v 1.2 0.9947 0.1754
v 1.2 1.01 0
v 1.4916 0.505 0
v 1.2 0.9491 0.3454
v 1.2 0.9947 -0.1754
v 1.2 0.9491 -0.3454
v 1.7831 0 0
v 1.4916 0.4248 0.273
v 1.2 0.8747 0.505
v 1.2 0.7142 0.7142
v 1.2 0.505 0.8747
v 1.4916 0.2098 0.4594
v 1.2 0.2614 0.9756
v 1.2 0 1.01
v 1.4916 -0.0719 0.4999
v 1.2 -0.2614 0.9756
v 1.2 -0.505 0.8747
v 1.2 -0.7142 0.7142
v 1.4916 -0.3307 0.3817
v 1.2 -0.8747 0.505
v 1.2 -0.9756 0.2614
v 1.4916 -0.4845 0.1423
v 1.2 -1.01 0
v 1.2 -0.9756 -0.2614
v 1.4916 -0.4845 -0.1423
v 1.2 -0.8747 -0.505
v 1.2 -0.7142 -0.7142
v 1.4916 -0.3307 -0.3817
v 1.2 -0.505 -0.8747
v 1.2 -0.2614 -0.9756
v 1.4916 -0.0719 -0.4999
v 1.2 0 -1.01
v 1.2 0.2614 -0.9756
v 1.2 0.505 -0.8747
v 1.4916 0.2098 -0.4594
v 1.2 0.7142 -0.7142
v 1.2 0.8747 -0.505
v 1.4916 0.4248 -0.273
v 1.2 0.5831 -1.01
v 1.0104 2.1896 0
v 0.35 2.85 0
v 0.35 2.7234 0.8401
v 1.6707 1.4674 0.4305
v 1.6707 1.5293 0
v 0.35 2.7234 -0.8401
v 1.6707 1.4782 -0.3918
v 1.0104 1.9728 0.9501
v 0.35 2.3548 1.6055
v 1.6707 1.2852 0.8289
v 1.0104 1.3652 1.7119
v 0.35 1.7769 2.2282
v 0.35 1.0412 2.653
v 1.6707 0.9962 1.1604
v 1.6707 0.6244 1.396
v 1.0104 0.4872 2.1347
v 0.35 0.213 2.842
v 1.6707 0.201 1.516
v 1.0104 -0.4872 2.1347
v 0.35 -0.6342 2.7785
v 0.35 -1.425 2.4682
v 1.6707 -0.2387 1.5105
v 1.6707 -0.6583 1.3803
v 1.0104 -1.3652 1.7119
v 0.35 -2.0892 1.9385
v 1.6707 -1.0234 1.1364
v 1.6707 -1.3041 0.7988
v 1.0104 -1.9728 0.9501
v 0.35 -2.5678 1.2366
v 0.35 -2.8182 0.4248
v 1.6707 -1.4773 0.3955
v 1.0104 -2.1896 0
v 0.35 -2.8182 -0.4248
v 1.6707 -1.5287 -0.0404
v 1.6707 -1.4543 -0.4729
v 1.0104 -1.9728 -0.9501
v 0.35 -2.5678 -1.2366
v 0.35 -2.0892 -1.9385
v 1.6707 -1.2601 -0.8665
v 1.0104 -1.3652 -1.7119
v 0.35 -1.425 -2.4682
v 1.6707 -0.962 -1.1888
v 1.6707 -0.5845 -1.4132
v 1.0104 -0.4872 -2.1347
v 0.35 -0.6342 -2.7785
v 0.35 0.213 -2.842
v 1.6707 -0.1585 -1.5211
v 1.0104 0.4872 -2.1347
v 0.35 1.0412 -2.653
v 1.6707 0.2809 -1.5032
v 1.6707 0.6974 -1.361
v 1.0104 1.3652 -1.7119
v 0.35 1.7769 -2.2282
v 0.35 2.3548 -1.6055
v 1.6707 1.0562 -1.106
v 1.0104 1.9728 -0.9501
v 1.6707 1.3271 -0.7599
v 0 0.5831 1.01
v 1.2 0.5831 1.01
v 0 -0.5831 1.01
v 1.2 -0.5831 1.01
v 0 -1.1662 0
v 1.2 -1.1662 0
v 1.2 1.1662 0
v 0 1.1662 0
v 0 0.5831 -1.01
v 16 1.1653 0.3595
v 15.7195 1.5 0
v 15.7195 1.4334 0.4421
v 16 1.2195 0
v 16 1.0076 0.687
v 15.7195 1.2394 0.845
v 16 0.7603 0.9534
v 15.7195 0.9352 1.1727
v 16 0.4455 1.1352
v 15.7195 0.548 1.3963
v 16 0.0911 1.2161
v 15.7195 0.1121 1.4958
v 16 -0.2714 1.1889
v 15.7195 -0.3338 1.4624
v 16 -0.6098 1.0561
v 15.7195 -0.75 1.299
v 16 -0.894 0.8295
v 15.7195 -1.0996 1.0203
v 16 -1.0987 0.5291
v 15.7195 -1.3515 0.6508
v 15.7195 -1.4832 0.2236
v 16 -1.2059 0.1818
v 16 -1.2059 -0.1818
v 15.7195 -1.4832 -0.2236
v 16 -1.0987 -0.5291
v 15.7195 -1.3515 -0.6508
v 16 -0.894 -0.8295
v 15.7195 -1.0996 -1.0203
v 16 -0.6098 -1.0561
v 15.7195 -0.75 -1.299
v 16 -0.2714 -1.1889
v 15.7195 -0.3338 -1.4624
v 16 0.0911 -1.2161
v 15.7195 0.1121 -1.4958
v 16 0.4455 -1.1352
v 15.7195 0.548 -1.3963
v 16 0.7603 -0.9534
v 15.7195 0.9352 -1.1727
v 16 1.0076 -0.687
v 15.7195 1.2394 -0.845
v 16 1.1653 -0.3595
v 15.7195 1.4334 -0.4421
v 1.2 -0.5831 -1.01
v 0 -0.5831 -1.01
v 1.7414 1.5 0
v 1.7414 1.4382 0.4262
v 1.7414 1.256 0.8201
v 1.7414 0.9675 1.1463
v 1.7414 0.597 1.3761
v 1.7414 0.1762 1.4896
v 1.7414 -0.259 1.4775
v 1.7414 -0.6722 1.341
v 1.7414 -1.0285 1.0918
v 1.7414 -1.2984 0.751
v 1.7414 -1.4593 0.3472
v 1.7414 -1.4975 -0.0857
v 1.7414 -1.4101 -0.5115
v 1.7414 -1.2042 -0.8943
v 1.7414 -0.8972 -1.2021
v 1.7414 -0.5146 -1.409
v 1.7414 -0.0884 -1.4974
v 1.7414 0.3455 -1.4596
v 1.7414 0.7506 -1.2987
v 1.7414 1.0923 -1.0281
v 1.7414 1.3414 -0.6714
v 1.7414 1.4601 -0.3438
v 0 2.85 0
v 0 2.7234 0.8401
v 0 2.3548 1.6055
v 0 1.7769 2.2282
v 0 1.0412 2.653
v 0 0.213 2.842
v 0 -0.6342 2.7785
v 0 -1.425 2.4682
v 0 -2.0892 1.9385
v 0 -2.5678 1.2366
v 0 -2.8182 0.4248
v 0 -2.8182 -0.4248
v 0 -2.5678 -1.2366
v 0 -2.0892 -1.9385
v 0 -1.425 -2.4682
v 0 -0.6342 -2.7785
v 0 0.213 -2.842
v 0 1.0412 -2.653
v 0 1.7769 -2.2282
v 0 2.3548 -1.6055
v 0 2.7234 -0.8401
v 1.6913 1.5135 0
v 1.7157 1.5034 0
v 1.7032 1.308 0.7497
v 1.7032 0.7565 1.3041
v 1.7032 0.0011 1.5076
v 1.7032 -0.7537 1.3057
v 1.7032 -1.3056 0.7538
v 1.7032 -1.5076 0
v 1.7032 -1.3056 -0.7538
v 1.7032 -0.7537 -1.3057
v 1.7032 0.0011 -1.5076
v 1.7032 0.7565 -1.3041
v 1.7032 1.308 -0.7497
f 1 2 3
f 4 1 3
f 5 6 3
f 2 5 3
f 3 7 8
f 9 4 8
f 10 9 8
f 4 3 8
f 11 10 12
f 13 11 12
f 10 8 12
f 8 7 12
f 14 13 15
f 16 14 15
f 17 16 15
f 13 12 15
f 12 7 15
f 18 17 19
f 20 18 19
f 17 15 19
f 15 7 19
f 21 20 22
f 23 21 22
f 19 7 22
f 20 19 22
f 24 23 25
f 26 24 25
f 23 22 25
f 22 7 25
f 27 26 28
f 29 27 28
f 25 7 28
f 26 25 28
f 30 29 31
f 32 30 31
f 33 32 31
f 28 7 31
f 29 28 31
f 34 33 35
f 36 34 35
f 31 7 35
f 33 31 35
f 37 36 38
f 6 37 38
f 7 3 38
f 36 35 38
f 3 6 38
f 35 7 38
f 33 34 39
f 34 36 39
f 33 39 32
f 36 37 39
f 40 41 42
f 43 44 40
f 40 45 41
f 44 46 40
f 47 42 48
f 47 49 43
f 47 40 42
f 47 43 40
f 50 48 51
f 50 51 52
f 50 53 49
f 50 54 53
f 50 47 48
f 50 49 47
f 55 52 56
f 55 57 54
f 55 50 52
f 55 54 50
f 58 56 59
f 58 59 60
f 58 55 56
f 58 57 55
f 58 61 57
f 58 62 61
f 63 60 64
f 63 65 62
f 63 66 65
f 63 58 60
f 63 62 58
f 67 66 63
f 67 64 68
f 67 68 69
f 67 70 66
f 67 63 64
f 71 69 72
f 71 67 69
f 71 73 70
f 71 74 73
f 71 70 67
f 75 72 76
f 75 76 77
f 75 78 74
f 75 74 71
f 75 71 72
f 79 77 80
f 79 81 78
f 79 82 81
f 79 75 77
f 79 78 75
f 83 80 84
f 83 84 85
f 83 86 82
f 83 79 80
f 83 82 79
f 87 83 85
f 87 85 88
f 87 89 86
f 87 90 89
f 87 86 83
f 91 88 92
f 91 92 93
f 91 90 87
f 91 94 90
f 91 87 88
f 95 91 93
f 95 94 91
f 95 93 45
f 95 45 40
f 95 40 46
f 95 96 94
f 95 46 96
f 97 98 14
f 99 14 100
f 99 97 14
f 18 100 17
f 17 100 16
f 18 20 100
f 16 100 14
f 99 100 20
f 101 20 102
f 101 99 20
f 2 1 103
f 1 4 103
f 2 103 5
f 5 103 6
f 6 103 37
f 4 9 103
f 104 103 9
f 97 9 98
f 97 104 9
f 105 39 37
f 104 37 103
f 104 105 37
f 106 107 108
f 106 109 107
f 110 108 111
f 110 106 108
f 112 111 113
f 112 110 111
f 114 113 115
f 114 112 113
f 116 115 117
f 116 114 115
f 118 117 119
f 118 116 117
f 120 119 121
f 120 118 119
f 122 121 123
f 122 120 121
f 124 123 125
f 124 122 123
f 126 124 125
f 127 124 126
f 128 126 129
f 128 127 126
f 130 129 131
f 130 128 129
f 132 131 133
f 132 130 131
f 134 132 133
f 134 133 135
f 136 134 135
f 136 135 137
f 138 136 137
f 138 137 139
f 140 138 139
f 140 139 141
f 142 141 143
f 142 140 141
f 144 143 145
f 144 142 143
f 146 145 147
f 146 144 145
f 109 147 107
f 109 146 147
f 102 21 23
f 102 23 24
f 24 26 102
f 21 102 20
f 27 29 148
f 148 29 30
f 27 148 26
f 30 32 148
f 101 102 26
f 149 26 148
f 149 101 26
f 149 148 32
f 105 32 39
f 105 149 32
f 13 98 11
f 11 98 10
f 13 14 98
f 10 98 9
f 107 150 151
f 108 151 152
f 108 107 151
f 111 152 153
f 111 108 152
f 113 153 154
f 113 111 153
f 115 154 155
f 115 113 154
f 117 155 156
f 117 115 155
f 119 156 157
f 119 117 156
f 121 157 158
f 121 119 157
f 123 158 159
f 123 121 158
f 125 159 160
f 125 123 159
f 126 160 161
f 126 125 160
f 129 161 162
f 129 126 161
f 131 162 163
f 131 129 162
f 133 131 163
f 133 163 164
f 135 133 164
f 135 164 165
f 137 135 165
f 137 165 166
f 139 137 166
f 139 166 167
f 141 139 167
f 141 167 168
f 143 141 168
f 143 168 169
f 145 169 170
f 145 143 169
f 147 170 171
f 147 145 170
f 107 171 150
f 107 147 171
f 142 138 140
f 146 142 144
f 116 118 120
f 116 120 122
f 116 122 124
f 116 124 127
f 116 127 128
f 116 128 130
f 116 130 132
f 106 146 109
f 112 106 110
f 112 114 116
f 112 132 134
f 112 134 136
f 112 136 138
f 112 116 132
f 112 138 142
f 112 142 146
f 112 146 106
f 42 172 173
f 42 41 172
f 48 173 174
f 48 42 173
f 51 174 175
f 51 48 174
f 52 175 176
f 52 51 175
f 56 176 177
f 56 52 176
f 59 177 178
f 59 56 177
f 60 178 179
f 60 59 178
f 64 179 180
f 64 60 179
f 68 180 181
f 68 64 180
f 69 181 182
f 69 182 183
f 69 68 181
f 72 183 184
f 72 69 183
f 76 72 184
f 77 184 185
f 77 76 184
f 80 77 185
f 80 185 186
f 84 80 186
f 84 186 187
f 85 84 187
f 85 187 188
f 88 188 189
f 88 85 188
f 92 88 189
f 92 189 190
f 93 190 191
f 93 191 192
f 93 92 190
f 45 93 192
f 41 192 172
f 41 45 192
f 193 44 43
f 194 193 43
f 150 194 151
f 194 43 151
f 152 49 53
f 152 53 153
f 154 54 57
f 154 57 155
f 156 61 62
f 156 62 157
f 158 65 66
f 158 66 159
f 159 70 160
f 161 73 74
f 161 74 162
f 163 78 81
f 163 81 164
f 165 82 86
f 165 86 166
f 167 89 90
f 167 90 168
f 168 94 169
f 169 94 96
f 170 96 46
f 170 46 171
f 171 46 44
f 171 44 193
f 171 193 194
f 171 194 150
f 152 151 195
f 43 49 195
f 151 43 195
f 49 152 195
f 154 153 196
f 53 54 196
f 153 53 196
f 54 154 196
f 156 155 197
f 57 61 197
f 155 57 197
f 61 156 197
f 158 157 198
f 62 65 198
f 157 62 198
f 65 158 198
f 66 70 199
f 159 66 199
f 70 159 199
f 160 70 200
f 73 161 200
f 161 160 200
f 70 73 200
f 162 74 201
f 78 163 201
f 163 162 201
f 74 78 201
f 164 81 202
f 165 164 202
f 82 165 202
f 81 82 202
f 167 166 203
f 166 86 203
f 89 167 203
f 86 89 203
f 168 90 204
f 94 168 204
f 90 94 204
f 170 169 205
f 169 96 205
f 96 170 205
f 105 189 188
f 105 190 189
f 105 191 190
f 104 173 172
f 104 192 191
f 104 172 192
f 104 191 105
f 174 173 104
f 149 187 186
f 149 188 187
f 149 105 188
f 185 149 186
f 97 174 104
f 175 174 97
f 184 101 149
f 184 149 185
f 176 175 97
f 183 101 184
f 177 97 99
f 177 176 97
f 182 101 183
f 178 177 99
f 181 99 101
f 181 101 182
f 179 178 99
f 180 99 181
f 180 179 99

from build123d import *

# Parameters (mm, degrees)
FILLET1_R   = 0.1
HEX_2_DEPTH = 1.2


with BuildPart() as part:
    # BodySke → BaseBody (revolve)
    with BuildSketch(Plane.XY):
        Polygon((0, 0), (0, 2.85), (0.35, 2.85), (1.7, 1.5), (15.7195, 1.5), (16, 1.2195), (16, 0), align=None)
    revolve(axis=Axis((0, 0, 0), (1, 0, 0)))

    # Fillet1
    fillet1_edges = [part.edges().sort_by_distance(p)[0] for p in [
        (1.7, -1.5, 0),
    ]]
    fillet(fillet1_edges, radius=FILLET1_R)

    # Sketch2 → PreBroach (revolve, cut)
    with BuildSketch(Plane.XY):
        Polygon((0, 1.01), (1.2, 1.01), (1.783123772, 0), (0, 0), align=None)
    revolve(axis=Axis((0, 0, 0), (1, 0, 0)), mode=Mode.SUBTRACT)

    # Sketch3 → Hex 2 (cut)
    with BuildSketch(Plane.ZY):
        Polygon((-1.01, -0.583123772), (-1.01, 0.583123772), (0, 1.166247544), (1.01, 0.583123772), (1.01, -0.583123772), (0, -1.166247544), align=None)
    extrude(amount=-HEX_2_DEPTH, mode=Mode.SUBTRACT)


solid = part.part
